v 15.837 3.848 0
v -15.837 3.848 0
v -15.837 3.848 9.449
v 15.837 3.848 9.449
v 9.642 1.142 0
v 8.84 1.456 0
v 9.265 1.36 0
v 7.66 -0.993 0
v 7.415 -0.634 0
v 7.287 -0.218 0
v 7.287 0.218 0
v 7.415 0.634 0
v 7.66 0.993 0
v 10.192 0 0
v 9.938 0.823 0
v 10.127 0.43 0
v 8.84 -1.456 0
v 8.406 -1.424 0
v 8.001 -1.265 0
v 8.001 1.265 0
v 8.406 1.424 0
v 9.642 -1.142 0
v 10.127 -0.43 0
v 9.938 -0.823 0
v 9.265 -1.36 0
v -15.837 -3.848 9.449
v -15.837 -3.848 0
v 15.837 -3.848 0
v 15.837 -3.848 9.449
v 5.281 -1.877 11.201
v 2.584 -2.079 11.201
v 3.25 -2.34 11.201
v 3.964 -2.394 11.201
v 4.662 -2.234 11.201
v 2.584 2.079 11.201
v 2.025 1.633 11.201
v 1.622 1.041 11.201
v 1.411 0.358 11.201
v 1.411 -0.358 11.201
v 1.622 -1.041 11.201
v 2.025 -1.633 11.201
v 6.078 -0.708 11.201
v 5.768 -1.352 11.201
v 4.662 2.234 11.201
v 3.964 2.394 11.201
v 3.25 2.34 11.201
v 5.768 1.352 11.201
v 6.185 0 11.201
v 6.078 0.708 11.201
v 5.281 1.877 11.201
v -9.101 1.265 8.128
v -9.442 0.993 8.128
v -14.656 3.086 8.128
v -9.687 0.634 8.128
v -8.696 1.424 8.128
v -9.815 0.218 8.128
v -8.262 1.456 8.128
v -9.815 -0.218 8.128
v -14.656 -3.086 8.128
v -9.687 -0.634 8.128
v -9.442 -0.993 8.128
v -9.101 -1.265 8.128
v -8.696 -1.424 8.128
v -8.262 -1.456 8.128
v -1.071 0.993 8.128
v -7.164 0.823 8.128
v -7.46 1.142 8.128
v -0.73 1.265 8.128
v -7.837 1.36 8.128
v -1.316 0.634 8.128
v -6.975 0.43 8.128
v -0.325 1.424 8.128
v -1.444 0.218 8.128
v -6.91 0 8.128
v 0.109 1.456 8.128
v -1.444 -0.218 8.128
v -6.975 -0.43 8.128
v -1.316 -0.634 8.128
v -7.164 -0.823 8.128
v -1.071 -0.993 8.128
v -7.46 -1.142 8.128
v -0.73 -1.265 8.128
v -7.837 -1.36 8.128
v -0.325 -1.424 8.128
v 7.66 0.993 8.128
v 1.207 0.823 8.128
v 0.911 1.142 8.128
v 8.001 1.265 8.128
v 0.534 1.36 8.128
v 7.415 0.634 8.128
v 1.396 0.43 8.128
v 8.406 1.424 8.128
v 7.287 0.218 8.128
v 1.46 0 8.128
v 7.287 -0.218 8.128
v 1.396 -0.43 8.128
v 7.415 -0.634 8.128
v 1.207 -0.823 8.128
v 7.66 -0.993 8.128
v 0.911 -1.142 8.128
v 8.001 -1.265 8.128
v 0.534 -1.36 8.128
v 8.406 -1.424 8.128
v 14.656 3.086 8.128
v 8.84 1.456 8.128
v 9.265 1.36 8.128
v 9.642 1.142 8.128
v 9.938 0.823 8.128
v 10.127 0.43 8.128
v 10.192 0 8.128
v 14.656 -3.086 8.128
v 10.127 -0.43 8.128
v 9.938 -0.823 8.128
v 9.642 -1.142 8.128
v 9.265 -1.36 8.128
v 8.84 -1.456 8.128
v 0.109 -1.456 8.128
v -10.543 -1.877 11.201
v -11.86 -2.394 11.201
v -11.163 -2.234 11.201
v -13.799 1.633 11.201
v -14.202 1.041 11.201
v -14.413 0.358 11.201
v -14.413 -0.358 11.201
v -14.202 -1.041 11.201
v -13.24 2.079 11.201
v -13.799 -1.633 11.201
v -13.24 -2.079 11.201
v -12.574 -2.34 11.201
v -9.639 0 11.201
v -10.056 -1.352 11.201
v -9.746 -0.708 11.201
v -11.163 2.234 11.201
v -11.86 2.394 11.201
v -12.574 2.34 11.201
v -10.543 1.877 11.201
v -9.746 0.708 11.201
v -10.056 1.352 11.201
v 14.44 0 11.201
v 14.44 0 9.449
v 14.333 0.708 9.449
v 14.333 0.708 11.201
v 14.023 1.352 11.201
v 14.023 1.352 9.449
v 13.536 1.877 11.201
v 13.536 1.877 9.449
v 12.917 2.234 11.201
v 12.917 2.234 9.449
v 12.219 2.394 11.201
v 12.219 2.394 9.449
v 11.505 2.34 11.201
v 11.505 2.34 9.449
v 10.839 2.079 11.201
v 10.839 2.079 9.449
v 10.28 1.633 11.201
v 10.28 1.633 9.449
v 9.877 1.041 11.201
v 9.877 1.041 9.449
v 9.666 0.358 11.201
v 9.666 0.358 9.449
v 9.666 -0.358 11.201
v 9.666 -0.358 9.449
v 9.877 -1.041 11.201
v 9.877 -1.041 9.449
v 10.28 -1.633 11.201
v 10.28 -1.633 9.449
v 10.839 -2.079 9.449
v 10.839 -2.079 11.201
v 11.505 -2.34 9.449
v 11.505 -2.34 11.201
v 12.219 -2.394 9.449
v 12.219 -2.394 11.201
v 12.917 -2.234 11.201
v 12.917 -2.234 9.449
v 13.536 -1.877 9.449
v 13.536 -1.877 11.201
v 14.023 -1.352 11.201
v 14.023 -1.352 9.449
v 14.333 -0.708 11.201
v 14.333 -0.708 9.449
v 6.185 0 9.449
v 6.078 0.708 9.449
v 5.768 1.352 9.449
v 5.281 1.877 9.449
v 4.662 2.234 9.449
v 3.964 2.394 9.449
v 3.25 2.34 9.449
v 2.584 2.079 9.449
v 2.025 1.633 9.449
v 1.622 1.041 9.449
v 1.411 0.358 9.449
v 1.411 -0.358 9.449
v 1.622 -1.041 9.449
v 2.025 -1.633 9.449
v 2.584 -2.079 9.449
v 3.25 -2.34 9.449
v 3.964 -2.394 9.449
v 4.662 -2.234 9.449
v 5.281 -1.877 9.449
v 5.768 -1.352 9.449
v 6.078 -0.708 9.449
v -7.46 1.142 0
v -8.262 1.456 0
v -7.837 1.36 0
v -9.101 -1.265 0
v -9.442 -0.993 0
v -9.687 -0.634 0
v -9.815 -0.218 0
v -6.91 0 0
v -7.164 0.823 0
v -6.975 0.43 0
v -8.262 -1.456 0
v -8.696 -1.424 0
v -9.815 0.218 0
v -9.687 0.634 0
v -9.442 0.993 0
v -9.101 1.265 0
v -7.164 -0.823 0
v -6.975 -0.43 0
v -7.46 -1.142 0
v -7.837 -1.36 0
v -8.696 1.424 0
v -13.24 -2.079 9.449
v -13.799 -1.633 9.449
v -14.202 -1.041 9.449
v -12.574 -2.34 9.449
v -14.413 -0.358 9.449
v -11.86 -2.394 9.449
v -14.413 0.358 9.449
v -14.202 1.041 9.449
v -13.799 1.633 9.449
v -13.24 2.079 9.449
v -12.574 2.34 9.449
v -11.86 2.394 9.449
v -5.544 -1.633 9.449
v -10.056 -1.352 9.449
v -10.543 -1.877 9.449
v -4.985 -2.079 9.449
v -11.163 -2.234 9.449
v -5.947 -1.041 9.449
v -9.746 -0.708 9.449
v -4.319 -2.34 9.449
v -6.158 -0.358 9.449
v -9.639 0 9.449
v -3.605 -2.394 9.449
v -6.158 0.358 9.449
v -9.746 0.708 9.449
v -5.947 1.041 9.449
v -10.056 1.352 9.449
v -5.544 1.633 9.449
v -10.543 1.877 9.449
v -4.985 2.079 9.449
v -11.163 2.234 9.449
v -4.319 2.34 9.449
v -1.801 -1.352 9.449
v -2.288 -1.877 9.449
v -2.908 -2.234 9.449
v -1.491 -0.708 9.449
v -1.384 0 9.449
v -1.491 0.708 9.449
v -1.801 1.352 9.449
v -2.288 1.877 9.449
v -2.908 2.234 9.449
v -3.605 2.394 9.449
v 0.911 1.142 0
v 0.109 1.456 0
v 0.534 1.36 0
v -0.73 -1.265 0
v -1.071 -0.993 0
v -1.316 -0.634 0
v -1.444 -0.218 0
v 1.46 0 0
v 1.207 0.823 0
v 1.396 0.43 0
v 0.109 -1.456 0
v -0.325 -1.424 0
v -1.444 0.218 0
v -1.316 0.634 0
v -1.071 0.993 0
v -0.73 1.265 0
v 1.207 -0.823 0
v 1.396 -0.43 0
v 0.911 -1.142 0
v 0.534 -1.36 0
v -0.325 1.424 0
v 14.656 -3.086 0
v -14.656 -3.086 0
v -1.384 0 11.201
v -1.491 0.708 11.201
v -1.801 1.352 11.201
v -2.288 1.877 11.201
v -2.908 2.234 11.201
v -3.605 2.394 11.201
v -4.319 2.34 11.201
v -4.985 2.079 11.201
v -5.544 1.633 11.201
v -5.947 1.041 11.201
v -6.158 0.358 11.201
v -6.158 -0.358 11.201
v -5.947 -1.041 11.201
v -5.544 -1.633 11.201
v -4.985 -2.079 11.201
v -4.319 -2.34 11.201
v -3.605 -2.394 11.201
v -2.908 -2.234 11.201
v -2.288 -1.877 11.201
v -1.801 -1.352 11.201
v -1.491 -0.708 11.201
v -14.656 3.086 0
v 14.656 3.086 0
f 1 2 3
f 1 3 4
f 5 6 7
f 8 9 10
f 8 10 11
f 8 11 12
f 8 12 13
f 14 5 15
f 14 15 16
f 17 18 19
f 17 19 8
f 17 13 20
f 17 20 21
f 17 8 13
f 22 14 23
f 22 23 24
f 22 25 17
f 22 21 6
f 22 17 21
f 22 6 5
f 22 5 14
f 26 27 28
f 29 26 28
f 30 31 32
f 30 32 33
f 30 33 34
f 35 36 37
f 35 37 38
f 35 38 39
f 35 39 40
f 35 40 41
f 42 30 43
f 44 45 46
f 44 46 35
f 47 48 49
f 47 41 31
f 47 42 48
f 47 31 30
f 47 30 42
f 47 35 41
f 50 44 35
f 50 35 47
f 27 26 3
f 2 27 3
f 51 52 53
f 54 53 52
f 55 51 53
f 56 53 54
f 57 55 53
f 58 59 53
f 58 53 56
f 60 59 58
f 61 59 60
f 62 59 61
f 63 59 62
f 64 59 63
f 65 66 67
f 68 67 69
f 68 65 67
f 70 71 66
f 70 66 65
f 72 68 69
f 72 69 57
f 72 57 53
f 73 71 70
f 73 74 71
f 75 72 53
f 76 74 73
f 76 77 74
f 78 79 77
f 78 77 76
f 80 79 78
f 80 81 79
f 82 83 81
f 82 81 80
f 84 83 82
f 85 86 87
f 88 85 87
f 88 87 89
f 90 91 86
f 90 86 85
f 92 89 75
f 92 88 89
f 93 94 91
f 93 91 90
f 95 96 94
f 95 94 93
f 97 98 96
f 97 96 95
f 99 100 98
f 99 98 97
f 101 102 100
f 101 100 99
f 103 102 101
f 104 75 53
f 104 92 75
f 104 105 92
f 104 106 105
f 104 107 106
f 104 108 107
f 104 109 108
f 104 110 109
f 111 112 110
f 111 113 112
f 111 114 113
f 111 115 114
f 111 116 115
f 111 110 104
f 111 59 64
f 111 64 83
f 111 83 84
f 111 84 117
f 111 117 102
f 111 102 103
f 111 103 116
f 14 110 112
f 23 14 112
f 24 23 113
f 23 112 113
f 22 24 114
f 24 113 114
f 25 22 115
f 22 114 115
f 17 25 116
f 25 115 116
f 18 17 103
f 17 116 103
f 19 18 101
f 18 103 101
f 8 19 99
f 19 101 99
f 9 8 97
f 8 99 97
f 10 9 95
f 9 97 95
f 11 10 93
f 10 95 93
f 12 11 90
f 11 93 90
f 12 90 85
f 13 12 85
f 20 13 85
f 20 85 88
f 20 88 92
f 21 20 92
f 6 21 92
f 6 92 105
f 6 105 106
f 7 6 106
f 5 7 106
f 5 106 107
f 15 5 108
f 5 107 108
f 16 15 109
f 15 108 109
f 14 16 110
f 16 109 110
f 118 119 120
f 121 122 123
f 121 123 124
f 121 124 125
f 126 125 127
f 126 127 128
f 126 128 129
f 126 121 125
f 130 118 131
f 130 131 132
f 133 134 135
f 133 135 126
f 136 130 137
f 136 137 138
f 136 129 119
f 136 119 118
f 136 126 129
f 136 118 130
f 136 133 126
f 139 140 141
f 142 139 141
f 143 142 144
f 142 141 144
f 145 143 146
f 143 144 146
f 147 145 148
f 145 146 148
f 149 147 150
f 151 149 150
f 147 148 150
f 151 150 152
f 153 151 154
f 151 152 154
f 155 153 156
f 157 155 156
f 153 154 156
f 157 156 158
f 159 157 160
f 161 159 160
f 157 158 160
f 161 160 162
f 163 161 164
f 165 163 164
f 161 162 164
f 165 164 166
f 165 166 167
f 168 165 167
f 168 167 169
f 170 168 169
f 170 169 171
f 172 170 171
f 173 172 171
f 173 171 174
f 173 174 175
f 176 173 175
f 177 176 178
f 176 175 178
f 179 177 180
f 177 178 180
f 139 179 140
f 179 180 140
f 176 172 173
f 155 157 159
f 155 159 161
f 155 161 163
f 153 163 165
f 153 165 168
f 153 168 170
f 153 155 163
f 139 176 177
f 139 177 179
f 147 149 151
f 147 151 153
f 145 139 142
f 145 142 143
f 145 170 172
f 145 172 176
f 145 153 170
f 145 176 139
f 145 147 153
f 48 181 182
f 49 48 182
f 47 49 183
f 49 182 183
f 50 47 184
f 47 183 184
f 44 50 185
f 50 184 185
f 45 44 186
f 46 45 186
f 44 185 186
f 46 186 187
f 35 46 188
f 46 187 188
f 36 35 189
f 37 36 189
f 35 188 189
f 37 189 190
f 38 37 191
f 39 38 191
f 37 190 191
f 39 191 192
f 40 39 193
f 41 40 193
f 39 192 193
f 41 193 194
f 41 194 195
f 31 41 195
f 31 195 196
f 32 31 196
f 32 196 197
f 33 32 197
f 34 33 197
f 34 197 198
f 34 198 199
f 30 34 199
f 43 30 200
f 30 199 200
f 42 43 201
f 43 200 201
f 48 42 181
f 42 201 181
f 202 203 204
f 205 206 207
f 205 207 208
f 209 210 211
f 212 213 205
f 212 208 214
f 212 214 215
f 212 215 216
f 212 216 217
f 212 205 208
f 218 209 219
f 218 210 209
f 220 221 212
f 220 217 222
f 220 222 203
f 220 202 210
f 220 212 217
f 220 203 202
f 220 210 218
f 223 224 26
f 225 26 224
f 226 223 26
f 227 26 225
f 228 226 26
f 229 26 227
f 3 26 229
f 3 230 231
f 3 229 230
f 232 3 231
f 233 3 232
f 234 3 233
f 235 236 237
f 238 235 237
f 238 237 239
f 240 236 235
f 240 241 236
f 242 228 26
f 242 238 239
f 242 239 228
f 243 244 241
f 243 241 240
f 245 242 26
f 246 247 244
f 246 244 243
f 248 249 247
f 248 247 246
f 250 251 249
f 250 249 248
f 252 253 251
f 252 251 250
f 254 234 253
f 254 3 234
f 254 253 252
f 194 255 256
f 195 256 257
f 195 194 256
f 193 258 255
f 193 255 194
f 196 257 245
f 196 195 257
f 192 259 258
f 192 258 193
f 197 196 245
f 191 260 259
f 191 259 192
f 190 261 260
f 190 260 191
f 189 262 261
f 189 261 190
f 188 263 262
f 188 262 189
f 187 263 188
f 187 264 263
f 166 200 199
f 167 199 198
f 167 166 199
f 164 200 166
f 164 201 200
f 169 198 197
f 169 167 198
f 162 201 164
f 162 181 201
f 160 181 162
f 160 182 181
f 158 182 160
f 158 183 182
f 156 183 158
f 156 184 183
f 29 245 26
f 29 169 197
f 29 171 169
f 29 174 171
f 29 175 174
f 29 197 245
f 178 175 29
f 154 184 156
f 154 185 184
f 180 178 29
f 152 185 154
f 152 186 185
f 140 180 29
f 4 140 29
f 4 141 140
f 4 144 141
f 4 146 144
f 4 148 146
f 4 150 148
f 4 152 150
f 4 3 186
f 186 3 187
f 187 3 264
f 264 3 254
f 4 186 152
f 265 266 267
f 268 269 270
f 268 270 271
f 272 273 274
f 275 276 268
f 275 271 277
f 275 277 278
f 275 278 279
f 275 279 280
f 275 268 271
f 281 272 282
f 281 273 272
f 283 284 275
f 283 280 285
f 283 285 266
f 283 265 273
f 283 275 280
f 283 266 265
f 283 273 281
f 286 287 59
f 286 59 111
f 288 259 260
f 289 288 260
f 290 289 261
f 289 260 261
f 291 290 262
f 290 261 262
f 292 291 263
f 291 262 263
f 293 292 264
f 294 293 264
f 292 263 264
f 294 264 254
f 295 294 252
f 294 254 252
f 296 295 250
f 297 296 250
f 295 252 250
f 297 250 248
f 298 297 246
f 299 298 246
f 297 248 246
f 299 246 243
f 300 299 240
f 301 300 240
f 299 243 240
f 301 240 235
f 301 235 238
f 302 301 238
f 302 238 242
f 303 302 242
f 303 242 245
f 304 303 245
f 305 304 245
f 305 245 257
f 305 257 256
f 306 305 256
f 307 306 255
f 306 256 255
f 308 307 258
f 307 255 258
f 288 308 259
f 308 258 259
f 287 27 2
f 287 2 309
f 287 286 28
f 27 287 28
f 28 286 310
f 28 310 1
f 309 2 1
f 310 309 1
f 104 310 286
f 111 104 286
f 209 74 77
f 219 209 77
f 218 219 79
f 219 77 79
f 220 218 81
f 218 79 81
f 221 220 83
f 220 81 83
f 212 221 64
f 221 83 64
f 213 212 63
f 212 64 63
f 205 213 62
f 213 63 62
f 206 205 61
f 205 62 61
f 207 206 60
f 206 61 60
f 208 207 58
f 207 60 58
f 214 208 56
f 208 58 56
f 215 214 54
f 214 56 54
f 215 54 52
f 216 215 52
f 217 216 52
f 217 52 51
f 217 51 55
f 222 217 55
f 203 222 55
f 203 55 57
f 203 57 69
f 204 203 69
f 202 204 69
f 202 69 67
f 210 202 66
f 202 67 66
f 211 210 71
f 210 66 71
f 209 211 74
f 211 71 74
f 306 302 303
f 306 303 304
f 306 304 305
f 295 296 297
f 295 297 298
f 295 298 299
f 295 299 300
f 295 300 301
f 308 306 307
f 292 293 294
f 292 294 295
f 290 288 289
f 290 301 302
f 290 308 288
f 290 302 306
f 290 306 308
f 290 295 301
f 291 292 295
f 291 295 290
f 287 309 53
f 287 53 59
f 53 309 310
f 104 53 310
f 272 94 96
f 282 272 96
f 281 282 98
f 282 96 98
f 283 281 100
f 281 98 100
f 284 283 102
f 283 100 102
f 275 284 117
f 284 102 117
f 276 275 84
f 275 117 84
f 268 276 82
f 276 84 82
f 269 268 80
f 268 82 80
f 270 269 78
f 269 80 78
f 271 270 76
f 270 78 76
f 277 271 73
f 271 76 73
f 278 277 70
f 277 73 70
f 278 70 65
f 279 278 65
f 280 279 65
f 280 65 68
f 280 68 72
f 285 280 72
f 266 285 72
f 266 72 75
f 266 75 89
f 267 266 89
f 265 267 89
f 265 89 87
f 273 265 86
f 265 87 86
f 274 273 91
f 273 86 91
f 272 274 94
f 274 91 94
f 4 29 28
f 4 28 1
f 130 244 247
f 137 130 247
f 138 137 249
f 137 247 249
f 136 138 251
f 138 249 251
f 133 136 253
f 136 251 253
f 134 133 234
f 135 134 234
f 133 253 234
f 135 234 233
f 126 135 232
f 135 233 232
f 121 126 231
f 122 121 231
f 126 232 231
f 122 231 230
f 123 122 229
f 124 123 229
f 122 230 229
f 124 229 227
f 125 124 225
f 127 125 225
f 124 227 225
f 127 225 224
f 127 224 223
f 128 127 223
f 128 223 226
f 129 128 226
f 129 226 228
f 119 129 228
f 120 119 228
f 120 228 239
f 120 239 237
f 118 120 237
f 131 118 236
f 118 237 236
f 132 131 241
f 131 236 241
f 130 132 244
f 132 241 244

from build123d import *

# Parameters (mm, degrees)
F0_W     = 31.6738
F0_H     = 7.6962
F1_DEPTH = 9.4488
F2_R     = 2.4003
F3_DEPTH = 1.7526
F4_W     = 29.3116
F4_H     = 6.1722
F5_DEPTH = 8.128
F6_R     = 1.4605
F7_DEPTH = 8.128


with BuildPart() as f1:
    # F0 (on Top) → F1 (new body)
    with BuildSketch(Plane.XY):
        Rectangle(F0_W, F0_H)
    extrude(amount=F1_DEPTH)

    # F2 (on face) → F3 (join)
    with BuildSketch(Plane.XY.offset(9.4488)):
        with Locations((-12.0396, 0)):
            Circle(F2_R)
        with Locations((-3.7846, 0)):
            Circle(F2_R)
        with Locations((3.7846, 0)):
            Circle(F2_R)
        with Locations((12.0396, 0)):
            Circle(F2_R)
    extrude(amount=F3_DEPTH)

    # F4 (on face) → F5 (cut)
    with BuildSketch(Plane(origin=(0, 0, 0), x_dir=(1, 0, 0), z_dir=(0, 0, -1))):
        Rectangle(F4_W, F4_H)
    extrude(amount=-F5_DEPTH, mode=Mode.SUBTRACT)

    # F6 (on face) → F7 (join)
    with BuildSketch(Plane(origin=(0, 0, 8.128), x_dir=(1, 0, 0), z_dir=(0, 0, -1))):
        Circle(F6_R)
        with Locations((8.731115, 0)):
            Circle(F6_R)
        with Locations((-8.370964, 0)):
            Circle(F6_R)
    extrude(amount=F7_DEPTH)


solid = f1.part
